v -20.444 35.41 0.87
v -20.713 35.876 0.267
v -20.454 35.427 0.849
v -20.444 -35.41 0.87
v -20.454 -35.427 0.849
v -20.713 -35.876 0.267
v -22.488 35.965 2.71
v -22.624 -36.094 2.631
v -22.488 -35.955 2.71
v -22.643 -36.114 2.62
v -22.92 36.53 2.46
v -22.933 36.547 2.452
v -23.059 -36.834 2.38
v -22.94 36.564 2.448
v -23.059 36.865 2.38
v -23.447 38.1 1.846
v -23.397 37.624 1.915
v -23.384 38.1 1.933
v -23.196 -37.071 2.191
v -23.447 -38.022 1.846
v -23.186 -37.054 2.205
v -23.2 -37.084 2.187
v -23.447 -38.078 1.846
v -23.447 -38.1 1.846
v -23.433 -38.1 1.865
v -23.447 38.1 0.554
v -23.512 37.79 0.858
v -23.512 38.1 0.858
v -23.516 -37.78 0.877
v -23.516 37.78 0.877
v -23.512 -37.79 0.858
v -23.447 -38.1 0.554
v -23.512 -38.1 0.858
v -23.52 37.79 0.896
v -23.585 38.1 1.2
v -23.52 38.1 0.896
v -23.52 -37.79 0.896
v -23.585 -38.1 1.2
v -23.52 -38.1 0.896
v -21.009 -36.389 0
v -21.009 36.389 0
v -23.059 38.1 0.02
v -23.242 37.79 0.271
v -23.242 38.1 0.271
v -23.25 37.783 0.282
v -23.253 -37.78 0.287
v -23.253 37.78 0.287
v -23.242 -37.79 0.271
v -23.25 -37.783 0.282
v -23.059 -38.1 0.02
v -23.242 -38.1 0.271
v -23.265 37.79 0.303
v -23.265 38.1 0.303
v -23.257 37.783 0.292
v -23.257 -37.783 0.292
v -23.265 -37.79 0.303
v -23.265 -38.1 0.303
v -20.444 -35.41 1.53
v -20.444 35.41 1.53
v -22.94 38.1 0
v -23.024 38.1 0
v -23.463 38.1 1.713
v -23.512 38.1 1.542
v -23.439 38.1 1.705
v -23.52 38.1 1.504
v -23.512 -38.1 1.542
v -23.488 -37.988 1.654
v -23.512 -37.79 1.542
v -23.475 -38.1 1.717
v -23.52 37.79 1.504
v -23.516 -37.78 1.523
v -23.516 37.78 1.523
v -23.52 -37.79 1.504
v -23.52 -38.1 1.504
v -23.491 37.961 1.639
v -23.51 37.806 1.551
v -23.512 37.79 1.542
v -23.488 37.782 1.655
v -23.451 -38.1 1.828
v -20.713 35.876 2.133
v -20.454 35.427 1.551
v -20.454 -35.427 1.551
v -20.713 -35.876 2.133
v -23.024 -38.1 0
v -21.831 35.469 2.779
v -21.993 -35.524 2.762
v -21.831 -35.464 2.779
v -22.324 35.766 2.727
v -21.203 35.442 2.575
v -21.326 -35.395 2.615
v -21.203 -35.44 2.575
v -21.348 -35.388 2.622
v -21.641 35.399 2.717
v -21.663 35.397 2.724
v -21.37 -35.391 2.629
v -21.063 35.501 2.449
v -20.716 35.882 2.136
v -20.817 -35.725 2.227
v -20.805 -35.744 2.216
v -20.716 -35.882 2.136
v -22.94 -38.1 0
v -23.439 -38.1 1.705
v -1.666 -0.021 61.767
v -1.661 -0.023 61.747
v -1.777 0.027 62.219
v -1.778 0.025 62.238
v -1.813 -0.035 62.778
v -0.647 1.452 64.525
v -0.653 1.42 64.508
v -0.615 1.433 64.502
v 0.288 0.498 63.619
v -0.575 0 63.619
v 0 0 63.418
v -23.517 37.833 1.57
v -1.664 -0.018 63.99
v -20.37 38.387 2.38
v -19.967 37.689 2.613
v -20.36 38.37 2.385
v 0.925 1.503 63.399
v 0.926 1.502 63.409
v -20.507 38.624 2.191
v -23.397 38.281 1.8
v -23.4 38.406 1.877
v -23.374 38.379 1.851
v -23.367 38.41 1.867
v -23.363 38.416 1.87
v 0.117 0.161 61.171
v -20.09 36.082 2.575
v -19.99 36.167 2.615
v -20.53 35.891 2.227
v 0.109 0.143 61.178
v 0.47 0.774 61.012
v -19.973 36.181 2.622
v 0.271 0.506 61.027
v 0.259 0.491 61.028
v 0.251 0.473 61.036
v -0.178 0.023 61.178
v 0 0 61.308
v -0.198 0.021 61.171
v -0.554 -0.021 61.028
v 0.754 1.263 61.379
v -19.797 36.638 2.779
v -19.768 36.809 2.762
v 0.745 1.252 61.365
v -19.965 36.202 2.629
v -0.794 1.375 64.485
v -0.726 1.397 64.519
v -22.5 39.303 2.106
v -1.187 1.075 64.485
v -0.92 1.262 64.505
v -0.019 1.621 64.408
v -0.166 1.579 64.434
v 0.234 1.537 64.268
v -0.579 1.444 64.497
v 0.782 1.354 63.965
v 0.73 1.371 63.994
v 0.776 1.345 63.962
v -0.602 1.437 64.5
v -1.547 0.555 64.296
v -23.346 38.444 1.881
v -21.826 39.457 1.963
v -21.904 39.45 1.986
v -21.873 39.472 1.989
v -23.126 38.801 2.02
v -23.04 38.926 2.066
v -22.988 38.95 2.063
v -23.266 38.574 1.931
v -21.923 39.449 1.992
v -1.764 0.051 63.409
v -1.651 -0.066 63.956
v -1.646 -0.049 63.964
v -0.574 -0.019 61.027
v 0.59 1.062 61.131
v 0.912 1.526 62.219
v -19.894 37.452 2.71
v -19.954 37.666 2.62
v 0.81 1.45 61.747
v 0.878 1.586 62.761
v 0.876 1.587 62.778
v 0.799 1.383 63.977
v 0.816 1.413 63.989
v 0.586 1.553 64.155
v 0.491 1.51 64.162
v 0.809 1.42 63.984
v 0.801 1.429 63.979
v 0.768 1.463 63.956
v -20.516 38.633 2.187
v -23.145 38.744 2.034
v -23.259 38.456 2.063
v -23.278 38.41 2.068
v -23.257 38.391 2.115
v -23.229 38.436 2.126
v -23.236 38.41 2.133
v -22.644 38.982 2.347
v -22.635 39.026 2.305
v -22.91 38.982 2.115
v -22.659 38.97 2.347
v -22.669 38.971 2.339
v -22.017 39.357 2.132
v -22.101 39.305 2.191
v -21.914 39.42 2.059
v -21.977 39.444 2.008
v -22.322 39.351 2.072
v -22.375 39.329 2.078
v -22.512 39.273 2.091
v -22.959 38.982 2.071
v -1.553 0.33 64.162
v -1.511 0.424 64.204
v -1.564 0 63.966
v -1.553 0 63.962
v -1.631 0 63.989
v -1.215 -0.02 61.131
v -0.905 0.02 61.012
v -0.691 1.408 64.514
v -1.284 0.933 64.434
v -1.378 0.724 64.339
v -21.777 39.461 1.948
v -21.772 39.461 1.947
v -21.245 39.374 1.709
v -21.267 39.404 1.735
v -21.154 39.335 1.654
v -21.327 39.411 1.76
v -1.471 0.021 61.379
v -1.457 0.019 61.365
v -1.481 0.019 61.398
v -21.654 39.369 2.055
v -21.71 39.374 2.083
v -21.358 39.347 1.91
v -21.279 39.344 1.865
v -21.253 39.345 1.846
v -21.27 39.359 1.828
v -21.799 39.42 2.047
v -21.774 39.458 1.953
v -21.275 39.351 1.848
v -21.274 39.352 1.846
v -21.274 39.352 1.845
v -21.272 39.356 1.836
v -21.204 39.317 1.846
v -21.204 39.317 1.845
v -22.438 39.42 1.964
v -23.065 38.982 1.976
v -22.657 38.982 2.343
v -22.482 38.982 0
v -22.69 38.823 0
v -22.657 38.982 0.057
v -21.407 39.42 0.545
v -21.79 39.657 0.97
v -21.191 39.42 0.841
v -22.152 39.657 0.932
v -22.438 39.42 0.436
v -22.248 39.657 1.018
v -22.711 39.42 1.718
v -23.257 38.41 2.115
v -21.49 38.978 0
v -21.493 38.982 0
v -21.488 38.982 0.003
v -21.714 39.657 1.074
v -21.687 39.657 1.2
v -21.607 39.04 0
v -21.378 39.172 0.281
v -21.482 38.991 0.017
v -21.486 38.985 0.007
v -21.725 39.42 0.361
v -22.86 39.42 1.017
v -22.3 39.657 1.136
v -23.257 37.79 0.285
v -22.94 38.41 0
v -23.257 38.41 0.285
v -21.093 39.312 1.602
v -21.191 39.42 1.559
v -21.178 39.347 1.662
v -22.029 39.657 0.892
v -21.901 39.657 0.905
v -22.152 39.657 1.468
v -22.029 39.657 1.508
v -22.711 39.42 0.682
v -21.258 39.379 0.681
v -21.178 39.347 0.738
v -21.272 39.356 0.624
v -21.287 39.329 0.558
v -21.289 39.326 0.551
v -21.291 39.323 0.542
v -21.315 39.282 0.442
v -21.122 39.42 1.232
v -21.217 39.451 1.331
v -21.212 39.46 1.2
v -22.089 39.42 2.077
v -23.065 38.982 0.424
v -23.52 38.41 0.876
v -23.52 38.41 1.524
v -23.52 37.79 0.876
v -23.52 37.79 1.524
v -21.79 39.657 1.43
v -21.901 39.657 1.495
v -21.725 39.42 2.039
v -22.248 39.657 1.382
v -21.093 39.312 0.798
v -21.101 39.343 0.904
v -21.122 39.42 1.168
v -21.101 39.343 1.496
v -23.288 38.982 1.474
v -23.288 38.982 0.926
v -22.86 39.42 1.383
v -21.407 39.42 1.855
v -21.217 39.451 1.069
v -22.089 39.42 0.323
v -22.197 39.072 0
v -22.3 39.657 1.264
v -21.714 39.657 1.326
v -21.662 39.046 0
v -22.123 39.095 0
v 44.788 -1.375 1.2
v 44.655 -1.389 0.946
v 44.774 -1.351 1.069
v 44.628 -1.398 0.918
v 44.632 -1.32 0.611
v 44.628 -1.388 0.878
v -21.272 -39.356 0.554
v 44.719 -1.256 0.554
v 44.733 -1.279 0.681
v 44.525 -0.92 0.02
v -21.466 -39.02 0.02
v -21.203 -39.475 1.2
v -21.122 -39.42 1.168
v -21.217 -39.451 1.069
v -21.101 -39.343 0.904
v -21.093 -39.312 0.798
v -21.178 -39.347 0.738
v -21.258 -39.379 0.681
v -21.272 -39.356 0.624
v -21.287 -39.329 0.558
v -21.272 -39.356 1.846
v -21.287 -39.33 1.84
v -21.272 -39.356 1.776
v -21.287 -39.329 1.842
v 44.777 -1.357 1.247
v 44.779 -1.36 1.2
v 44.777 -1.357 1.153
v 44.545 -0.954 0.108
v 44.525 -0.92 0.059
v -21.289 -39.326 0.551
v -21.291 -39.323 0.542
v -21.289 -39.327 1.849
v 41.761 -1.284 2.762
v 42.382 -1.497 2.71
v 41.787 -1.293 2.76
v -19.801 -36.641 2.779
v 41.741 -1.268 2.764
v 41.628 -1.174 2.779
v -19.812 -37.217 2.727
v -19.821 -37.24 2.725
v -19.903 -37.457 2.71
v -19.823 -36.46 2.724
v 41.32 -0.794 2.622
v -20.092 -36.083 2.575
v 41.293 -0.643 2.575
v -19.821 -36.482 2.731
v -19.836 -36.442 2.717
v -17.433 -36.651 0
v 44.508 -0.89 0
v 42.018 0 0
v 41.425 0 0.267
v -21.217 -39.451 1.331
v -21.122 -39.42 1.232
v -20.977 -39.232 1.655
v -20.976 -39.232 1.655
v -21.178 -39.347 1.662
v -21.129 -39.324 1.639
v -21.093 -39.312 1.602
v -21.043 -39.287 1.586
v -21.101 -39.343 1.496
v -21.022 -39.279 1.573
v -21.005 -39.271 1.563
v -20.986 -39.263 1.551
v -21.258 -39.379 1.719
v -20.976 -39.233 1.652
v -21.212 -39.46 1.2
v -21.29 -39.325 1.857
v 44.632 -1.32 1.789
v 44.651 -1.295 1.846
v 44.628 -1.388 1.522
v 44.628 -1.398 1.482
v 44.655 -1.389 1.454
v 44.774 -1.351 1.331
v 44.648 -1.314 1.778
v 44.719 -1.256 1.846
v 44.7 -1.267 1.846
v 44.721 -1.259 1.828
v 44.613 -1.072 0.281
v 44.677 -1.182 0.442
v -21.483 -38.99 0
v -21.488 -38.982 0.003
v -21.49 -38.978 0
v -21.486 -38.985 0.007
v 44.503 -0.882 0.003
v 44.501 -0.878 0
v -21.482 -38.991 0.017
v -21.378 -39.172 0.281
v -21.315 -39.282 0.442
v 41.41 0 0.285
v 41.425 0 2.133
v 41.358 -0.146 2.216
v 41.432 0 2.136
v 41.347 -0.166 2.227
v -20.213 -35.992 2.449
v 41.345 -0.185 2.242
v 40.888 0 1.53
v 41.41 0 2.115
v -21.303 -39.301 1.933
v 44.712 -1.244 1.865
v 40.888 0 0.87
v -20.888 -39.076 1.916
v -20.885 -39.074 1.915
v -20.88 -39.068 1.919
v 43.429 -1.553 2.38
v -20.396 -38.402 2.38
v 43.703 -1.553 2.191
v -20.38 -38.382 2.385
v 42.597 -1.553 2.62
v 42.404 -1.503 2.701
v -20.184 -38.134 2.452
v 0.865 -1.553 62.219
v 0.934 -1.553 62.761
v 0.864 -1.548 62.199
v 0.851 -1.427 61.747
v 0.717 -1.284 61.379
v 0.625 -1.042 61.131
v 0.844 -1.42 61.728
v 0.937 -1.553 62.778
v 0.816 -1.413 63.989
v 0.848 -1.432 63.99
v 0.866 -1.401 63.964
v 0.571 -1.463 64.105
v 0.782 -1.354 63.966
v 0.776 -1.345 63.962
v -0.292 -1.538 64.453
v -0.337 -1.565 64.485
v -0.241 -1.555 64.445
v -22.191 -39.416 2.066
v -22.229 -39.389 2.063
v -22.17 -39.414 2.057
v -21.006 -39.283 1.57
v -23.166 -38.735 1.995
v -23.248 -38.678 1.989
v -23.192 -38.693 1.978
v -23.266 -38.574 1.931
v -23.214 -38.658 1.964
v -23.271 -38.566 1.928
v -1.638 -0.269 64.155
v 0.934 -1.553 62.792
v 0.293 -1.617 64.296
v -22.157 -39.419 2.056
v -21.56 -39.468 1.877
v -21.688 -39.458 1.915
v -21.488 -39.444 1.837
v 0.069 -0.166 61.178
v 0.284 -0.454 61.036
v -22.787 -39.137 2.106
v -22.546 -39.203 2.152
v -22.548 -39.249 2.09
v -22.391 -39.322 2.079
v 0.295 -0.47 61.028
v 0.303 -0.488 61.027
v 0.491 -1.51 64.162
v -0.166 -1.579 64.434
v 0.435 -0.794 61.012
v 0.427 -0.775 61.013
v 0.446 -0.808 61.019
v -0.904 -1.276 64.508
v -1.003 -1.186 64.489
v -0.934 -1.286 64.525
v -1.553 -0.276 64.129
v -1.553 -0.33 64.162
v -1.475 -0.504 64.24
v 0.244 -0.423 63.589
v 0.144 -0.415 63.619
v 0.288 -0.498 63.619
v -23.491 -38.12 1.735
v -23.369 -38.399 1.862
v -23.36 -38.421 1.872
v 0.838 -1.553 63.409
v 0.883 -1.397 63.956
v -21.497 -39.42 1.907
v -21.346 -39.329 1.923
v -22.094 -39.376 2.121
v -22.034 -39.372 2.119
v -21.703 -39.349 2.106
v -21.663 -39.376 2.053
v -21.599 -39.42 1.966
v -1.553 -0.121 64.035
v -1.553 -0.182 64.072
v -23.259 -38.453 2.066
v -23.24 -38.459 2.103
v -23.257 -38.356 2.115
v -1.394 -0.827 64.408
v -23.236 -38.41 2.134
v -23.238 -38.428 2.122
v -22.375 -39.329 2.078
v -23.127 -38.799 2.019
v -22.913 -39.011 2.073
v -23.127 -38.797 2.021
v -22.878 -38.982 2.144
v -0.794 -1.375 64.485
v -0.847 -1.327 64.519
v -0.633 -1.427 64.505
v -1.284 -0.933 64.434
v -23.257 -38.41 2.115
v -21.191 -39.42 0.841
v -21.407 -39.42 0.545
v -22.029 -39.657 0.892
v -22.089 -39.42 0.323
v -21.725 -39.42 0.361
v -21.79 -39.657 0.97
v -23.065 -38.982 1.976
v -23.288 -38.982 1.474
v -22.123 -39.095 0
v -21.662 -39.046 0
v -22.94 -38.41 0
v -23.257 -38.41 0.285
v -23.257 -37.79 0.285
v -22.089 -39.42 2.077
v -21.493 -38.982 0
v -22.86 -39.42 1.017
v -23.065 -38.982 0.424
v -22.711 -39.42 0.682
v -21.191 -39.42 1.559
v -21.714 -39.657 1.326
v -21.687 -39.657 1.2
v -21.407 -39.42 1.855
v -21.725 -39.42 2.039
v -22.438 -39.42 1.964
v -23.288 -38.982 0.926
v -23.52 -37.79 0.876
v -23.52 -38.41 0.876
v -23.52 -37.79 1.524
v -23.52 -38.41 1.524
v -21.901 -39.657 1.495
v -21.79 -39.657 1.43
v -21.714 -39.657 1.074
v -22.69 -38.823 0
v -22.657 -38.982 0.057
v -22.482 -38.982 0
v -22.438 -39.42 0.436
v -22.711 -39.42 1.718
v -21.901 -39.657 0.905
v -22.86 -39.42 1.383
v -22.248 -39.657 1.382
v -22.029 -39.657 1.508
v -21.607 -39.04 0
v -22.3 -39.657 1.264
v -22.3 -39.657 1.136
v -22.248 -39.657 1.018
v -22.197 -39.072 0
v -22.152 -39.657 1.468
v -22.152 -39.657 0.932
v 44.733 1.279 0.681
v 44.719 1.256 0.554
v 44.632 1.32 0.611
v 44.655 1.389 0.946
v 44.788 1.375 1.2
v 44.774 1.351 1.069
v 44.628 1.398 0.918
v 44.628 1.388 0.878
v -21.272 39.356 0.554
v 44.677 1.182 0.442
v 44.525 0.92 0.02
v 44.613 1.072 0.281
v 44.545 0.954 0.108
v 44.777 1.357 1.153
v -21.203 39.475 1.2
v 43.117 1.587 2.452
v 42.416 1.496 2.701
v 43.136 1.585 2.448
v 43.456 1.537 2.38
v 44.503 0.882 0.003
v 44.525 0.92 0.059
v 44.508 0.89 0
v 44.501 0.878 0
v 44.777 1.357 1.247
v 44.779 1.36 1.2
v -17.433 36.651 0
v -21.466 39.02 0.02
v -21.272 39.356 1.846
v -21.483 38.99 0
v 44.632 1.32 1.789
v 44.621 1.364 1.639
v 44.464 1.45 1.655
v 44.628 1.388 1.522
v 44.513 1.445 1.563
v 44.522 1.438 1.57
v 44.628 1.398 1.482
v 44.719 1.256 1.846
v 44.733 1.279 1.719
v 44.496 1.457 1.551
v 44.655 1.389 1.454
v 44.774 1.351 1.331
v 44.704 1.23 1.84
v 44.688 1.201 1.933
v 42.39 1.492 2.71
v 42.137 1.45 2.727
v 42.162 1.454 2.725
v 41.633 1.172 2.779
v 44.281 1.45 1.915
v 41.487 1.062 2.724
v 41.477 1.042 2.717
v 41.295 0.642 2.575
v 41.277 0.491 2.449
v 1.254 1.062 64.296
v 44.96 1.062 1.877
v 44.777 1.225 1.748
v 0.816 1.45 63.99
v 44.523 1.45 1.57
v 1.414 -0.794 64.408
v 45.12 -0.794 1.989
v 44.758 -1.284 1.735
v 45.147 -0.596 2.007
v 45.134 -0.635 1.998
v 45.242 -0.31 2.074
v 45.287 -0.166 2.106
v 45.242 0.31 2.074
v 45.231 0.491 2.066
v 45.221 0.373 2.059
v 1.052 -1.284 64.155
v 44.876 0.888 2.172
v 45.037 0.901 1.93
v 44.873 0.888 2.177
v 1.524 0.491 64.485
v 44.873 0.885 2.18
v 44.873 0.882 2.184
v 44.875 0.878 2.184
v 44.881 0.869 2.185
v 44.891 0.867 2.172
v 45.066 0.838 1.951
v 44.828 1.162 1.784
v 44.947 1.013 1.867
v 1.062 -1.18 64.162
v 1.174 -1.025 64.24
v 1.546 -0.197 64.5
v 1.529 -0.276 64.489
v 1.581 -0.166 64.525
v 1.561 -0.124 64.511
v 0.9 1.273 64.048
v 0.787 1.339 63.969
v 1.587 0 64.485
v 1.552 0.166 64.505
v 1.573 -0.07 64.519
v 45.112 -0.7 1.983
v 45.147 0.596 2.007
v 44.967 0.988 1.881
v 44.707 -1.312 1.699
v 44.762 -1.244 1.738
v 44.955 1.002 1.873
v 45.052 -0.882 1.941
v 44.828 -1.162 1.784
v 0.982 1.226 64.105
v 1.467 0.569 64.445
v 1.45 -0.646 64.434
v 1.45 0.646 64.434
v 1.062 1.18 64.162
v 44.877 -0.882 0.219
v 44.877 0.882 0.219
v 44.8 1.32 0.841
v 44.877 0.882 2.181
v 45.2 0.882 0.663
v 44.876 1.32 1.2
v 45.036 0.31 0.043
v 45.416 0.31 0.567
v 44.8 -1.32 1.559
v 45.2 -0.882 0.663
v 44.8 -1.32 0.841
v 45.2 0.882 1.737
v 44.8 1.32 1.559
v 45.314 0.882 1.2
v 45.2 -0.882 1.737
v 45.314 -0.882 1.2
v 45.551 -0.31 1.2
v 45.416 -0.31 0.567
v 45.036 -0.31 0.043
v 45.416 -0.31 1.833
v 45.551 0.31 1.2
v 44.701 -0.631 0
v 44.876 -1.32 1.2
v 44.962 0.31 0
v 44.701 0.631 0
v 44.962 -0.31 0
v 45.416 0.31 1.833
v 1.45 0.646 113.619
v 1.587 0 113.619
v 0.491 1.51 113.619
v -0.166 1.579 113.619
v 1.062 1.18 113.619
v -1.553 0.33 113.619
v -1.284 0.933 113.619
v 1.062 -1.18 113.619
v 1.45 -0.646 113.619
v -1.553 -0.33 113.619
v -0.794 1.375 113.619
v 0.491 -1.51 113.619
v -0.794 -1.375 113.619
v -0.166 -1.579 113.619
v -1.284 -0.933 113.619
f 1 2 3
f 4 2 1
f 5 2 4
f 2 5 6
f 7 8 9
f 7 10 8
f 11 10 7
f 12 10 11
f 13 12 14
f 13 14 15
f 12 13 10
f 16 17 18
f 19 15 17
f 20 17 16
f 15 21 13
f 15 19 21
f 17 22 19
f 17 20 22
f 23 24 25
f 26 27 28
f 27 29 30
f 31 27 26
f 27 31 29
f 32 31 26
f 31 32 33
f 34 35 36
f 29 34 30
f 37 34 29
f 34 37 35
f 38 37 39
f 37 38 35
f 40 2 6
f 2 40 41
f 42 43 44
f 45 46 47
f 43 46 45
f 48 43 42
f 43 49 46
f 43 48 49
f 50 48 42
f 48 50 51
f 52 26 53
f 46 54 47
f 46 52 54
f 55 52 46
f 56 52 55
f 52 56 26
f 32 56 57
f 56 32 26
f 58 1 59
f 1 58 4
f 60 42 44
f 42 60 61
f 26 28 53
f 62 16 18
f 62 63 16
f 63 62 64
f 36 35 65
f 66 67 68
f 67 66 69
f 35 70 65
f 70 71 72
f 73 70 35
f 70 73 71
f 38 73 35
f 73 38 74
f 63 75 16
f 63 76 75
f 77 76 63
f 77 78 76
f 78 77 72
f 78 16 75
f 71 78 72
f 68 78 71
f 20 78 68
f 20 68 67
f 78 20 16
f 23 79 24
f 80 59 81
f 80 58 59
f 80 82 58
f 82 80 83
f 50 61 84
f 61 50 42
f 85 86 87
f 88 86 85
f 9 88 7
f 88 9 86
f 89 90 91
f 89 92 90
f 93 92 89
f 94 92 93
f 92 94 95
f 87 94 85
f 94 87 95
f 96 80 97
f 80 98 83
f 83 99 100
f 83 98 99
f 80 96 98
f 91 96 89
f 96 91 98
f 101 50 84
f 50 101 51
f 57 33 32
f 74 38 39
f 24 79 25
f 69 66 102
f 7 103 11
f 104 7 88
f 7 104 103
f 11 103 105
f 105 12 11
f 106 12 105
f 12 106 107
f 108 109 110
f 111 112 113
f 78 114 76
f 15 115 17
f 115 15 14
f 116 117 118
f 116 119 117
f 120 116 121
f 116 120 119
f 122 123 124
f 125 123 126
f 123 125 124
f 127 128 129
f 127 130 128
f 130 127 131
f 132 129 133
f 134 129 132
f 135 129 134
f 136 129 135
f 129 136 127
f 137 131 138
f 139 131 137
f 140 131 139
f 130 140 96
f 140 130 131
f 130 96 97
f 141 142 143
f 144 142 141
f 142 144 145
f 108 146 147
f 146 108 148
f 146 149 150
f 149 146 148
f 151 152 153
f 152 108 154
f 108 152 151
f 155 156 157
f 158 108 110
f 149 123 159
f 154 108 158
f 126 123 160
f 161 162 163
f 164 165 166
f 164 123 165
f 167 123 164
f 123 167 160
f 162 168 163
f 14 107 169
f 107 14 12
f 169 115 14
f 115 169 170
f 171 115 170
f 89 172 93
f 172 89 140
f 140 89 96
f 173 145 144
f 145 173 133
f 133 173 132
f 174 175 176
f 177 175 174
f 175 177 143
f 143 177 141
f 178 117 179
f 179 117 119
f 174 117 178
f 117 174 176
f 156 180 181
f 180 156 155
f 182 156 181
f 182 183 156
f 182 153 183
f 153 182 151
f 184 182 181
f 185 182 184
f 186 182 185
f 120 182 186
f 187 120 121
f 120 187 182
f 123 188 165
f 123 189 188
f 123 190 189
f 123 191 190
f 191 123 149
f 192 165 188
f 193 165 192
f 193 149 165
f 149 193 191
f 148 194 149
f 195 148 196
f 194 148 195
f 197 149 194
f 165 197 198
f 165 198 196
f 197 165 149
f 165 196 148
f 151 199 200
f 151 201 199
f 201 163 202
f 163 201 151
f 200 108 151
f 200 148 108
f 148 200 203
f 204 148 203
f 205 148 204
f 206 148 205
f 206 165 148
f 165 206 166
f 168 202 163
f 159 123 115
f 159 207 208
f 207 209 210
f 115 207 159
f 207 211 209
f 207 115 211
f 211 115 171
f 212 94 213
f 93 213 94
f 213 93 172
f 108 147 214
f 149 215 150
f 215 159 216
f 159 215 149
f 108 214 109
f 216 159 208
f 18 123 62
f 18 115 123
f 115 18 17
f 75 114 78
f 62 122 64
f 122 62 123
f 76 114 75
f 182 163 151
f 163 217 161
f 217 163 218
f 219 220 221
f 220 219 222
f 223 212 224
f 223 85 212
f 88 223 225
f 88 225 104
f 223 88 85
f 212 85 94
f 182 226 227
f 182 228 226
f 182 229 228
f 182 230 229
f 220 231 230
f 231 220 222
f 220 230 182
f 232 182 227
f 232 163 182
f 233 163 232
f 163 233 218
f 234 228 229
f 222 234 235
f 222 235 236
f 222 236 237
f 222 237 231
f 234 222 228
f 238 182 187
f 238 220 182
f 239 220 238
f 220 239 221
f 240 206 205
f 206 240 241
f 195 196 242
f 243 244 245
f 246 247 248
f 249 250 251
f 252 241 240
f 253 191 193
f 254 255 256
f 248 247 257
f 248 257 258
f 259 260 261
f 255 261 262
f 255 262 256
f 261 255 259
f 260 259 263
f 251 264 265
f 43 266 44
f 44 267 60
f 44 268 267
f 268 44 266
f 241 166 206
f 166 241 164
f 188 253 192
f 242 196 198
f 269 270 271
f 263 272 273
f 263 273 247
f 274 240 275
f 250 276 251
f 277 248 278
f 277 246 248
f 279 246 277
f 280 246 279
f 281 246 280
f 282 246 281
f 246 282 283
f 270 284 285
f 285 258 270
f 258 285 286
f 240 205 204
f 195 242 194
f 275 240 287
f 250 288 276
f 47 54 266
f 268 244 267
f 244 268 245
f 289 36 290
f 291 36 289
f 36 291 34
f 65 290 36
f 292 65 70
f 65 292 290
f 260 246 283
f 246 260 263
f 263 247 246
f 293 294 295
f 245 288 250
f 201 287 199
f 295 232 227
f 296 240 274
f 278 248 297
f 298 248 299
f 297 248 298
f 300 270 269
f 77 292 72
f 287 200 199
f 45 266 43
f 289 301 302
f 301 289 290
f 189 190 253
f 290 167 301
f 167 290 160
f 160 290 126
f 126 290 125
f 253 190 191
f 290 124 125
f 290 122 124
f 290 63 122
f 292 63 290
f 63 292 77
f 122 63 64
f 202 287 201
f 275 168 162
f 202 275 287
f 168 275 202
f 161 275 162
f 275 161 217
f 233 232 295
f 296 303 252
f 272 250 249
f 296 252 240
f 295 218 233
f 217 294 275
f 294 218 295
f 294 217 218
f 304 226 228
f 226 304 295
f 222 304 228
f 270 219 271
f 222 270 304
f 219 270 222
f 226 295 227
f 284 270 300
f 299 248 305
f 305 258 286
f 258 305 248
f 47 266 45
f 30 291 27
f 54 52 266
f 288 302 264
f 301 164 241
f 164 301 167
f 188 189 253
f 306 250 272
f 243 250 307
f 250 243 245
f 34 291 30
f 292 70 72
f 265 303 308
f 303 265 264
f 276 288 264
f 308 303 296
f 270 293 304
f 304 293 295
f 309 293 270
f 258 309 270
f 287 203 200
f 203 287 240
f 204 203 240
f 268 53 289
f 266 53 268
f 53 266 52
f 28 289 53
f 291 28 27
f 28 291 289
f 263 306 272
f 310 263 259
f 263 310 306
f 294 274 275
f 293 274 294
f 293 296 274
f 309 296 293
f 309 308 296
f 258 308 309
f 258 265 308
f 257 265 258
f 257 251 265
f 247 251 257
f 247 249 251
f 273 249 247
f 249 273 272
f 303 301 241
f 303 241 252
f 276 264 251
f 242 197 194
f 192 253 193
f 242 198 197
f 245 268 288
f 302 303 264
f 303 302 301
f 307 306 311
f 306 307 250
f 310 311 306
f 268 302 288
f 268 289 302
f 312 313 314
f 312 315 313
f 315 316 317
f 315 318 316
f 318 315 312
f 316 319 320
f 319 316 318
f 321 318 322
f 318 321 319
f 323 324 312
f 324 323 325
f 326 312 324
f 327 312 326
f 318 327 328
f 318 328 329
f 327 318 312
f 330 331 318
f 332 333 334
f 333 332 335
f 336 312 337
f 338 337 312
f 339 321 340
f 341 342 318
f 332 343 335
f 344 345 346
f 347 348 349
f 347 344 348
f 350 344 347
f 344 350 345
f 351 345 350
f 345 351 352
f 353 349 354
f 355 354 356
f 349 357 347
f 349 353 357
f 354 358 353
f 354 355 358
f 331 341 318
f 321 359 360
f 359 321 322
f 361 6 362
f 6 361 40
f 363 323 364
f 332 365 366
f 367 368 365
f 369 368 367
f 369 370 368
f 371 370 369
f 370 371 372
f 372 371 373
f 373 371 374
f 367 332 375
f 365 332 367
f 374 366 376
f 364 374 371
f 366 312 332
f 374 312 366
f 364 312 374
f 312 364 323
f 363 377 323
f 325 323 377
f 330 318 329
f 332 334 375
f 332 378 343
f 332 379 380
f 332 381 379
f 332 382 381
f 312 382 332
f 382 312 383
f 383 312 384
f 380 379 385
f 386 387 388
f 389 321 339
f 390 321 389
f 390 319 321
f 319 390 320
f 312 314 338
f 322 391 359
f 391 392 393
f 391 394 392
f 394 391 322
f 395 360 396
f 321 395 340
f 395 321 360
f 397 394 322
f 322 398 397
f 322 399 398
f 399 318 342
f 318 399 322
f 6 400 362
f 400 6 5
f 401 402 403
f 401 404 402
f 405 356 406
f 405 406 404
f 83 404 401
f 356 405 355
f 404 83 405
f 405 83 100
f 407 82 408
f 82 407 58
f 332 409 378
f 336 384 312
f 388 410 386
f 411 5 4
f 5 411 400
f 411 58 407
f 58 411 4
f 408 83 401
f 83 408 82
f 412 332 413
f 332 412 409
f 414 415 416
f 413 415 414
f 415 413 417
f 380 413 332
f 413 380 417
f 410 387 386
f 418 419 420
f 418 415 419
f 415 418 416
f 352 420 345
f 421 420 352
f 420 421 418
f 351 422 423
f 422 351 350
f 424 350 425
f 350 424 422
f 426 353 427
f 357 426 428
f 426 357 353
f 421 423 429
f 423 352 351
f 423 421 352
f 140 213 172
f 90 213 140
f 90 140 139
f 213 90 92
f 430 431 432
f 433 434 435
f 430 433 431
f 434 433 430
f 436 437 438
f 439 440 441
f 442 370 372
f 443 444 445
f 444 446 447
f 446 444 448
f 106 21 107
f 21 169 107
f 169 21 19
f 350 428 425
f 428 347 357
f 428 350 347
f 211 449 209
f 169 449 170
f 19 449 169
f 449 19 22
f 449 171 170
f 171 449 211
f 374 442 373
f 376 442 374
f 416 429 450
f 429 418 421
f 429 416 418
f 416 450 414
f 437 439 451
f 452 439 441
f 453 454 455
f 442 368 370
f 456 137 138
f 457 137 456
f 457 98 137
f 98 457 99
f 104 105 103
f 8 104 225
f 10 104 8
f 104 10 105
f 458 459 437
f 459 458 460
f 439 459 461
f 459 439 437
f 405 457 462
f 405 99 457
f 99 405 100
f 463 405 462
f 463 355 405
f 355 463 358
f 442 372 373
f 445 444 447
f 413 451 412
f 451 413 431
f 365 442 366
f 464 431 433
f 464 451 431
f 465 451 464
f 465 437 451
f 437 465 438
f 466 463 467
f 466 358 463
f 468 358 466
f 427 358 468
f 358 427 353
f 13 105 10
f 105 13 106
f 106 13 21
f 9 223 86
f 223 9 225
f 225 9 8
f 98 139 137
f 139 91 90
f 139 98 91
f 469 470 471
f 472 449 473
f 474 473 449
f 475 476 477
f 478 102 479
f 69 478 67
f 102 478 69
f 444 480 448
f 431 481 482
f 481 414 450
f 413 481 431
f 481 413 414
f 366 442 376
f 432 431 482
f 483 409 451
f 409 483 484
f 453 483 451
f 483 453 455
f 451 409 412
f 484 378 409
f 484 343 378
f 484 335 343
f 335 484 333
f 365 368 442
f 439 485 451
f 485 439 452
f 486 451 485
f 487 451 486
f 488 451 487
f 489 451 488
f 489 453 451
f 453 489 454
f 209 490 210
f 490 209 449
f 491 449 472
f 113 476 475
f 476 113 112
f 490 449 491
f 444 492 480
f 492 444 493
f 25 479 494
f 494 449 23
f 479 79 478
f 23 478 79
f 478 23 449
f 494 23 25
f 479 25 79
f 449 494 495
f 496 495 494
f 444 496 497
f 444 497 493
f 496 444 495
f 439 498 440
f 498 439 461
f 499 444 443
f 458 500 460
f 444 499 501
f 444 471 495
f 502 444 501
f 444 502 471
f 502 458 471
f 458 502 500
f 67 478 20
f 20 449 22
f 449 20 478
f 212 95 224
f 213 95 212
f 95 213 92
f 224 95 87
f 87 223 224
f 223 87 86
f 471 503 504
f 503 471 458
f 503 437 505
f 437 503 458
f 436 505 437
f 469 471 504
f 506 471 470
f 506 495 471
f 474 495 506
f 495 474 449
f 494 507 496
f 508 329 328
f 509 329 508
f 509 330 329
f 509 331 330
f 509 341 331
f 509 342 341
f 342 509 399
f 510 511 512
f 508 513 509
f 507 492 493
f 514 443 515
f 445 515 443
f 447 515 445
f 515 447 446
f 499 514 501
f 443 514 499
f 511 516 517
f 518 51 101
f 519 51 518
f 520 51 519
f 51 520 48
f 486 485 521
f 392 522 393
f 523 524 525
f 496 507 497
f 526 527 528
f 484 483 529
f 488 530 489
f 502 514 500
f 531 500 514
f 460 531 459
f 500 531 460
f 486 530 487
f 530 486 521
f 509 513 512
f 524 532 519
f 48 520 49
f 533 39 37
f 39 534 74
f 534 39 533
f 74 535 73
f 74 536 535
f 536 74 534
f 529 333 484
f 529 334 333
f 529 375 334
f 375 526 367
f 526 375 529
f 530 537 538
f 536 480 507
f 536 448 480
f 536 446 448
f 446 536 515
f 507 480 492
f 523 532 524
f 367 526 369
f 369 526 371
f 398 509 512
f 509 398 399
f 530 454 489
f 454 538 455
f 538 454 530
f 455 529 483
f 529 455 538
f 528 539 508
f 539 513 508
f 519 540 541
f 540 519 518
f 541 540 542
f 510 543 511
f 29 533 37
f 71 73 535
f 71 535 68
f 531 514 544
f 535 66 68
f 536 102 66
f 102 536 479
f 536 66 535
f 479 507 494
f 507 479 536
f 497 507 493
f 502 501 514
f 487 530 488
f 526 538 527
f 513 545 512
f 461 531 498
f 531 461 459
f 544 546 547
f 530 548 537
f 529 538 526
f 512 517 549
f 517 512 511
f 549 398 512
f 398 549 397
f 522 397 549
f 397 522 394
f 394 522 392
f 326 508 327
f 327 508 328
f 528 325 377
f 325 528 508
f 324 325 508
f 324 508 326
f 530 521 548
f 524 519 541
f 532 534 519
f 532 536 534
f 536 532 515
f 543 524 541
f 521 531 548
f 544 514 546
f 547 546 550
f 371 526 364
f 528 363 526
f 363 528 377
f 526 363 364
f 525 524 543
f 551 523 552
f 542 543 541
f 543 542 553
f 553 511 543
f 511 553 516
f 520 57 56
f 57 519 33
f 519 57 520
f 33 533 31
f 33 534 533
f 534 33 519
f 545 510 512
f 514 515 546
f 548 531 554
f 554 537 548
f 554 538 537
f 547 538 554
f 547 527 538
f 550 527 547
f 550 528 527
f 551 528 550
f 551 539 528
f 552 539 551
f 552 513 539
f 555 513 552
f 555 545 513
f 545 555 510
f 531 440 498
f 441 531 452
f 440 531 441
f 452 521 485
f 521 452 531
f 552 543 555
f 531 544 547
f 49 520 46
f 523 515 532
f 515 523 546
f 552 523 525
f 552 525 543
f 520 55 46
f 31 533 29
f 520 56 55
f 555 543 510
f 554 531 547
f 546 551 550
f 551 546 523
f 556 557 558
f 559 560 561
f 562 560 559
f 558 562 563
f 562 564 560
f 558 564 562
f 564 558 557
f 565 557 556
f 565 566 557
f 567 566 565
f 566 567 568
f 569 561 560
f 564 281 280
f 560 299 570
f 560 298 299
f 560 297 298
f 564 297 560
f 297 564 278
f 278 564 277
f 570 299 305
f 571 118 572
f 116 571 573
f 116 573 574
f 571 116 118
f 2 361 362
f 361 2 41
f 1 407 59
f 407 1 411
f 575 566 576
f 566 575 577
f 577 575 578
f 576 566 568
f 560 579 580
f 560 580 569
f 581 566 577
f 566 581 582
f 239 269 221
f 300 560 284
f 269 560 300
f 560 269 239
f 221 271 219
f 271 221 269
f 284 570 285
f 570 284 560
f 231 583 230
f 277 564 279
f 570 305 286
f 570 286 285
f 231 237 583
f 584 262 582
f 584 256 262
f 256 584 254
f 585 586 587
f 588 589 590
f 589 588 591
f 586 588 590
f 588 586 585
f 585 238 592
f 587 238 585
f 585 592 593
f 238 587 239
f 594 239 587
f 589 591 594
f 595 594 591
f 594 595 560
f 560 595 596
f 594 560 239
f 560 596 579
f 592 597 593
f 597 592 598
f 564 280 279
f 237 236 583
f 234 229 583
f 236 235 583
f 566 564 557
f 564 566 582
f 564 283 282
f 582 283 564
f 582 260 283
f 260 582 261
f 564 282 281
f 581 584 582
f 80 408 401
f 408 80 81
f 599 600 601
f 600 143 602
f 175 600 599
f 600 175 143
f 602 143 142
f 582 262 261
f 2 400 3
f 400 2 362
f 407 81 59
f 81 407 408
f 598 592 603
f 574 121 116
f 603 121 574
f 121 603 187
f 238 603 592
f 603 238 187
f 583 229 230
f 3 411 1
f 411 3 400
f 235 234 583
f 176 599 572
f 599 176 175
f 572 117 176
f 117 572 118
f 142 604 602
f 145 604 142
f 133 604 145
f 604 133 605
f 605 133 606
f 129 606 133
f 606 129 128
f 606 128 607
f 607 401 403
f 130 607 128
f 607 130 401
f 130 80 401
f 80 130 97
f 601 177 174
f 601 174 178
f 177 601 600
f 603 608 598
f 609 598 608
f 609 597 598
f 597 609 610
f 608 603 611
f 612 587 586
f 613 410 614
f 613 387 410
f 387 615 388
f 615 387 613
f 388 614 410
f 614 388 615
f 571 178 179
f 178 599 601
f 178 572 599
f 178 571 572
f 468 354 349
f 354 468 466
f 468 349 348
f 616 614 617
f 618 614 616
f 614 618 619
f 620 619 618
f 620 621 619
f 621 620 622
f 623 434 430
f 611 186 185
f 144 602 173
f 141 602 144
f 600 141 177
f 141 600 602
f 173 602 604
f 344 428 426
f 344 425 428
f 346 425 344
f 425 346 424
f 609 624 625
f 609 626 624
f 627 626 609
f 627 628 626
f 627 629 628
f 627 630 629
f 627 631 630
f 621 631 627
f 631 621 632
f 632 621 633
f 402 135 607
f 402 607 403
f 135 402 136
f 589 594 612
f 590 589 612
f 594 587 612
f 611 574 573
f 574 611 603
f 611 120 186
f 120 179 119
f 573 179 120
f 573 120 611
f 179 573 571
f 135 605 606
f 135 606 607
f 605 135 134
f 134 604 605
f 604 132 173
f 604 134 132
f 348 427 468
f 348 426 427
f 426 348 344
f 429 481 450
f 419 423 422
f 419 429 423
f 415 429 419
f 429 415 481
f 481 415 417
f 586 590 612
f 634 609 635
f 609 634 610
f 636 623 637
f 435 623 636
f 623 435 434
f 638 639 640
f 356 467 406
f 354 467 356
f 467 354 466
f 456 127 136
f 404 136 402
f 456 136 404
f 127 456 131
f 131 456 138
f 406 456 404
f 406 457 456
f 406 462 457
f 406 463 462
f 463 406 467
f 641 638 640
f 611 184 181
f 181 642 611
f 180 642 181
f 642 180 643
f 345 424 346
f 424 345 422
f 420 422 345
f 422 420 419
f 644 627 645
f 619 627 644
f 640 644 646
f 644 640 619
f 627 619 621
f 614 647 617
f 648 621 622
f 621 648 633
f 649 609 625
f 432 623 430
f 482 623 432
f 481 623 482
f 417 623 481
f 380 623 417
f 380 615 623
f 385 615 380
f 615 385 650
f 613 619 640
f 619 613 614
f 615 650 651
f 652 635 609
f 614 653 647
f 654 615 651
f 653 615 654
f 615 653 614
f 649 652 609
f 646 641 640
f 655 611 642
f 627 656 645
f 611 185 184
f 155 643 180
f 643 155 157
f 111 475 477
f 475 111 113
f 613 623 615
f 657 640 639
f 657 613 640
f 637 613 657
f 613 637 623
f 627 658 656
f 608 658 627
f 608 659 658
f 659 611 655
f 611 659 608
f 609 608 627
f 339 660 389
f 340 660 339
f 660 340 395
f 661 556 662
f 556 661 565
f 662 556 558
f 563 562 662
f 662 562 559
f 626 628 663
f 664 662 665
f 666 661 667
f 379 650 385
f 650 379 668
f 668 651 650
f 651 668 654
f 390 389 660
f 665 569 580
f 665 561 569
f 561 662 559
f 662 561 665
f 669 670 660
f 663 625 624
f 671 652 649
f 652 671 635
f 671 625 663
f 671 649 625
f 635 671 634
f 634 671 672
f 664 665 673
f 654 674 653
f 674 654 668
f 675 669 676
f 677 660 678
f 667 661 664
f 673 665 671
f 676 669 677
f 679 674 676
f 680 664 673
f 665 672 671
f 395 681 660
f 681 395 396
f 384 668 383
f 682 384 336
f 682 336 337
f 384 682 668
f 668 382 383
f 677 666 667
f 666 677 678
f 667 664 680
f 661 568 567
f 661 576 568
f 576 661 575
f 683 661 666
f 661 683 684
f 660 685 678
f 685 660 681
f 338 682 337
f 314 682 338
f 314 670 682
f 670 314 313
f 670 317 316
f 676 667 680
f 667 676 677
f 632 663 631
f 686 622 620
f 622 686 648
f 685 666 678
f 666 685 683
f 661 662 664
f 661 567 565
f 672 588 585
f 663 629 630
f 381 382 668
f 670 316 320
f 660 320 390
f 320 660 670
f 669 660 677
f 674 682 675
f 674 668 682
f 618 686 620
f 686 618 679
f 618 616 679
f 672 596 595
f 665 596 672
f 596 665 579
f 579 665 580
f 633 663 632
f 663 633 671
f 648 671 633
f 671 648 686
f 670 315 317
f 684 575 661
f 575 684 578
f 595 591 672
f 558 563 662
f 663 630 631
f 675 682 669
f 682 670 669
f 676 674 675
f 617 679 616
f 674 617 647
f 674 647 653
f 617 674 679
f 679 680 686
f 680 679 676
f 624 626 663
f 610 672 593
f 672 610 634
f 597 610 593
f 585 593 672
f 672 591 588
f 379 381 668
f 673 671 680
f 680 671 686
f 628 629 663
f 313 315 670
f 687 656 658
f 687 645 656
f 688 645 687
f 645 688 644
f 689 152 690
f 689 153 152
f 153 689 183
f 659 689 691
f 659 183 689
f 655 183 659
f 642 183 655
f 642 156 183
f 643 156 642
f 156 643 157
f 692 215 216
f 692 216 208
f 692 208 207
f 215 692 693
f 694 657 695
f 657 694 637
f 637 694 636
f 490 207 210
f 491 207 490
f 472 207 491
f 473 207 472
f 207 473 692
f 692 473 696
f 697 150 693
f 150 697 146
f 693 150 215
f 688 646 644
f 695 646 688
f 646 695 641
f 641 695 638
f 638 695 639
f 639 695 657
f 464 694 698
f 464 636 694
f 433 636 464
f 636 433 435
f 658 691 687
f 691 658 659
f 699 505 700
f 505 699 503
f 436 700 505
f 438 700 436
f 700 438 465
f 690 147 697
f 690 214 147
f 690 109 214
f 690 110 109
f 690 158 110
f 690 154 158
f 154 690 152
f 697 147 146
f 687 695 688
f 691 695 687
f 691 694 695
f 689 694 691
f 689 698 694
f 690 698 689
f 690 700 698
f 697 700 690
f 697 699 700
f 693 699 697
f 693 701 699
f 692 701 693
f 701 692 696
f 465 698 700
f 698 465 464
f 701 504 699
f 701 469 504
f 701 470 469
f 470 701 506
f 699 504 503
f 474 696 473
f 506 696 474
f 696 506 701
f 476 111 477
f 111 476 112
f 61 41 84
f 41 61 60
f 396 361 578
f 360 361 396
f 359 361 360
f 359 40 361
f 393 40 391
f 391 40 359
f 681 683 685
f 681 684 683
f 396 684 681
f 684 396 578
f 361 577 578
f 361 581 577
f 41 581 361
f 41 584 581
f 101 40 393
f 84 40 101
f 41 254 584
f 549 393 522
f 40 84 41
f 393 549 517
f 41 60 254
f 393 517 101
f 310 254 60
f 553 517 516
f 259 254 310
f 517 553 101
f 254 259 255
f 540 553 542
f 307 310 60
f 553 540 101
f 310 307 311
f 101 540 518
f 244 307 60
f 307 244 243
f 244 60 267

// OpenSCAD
// Type of bubble frame
frame_type=1; // [1:Tetrahedron, 2:Octahedron, 3:Triangle Prism, 4:Hexahedron (cube), 5:Pentagon Prism, 6:Hexagon Prism]
// Length of edges in mm
edge_length=76.2;
// Length of handle in mm
handle_length=50;
// Radius of edges and handle
edge_radius=1.5875;

/* [Hidden] */
resolution=15;

// tetra
if (frame_type==1) {
  assign (numsides=3)
  {
  assign (radius2=(edge_length/2)/(sin((360/numsides)/2))) {
  assign (angle=360/numsides, angle2=90-(180/numsides), adjustup=sqrt(pow(radius2,2)-pow((edge_length/2),2))+1.2, numrotation=(((numsides-3)/2)-(((numsides-3)%2)*0.5))) {

    difference() {
      translate([0,0,1.2]) rotate(a=[-90,0,0]) union() {
        for (i=[angle:angle:360.1]) {
          assign (x=(radius2*cos(i)), y=0, z=(radius2*sin(i)), current_angle=(-1*(i+(angle/2))))
          {
          translate([x,y,z]) rotate(a=[0,current_angle,0]) cylinder(h = edge_length, r=edge_radius, center = false, $fn=resolution);
          translate([x,y,z]) rotate(a=[55,current_angle-30,0]) cylinder(h = edge_length, r=edge_radius, center = false, $fn=resolution);
          translate([x,y,z]) rotate(a=[55,current_angle-30,0]) cylinder(h = edge_length, r=edge_radius, center = false, $fn=resolution);
          translate([x,y,z]) sphere(edge_radius, $fn=resolution); 
          }
          translate([0,-(edge_length*cos(35)),0]) rotate(a=[90,0,0]) cylinder(h = handle_length, r=edge_radius, center = false, $fn=resolution);
        }
      }
      translate([-5-edge_length/2,-5-edge_length/2,-6]) rotate(a=[0,0,0]) cube(size = [edge_length+15,edge_length+15,6], center = false, $fn=resolution);
    }
  }
  }
  }
}

// octo
else if (frame_type==2) {
  assign (numsides=4)
  {
  assign (radius2=(edge_length/2)/(sin((360/numsides)/2))) {
  assign (angle=360/numsides, angle2=90-(180/numsides), adjustup=sqrt(pow(radius2,2)-pow((edge_length/2),2))+1.2, numrotation=(((numsides-3)/2)-(((numsides-3)%2)*0.5))) {
  
  difference() {
      translate([0,0,((edge_length/2)*cos(35))]) rotate(a=[45,35,0]) union() {
        for (i=[angle:angle:360.1]) {
          assign (x=(radius2*cos(i)), y=0, z=(radius2*sin(i)), current_angle=(-1*(i+(angle/2))))
          {
          translate([x,y,z]) rotate(a=[0,current_angle,0]) cylinder(h = edge_length, r=edge_radius, center = false, $fn=resolution);
          translate([x,y,z]) rotate(a=[45,current_angle-45,0]) cylinder(h = edge_length, r=edge_radius, center = false, $fn=resolution);
          translate([x,y,z]) rotate(a=[-45,current_angle-45,0]) cylinder(h = edge_length, r=edge_radius, center = false, $fn=resolution);
          translate([x,y,z]) sphere(edge_radius, $fn=resolution); 
          }
          translate([0,edge_length*cos(45),0]) sphere(edge_radius, $fn=resolution); 
          translate([0,-edge_length*cos(45),0]) sphere(edge_radius, $fn=resolution); 
          translate([0,0,edge_length*cos(45)]) cylinder(h = handle_length, r=edge_radius, center = false, $fn=resolution);
        }
      }
      translate([-5-edge_length/2,-5-edge_length/2,-6]) rotate(a=[0,0,0]) cube(size = [edge_length+15,edge_length+15,6], center = false, $fn=resolution);
    }
  }
  }
  }
}


// prisms
else {
  assign (numsides=frame_type)
  {
  assign (radius2=(edge_length/2)/(sin((360/numsides)/2))) {
  assign (angle=360/numsides, angle2=90-(180/numsides), adjustup=sqrt(pow(radius2,2)-pow((edge_length/2),2))+1.2, numrotation=(((numsides-3)/2)-(((numsides-3)%2)*0.5))) {

    difference() {
      translate([0,-(edge_length/2),adjustup]) rotate(a=[0,angle2-numrotation*angle,0]) union() {
        for (i=[angle:angle:360.1]) {
          assign (x=(radius2*cos(i)), y=0, z=(radius2*sin(i)), current_angle=(-1*(i+(angle/2))))
          {
          translate([x,y,z]) rotate(a=[0,current_angle,0]) cylinder(h = edge_length, r=edge_radius, center = false, $fn=resolution);
          translate([x,y,z]) sphere(edge_radius, $fn=resolution); 
          translate([x,y,z]) rotate(a=[-90,current_angle,0]) cylinder(h = edge_length, r=edge_radius, center = false, $fn=resolution);
          translate([x,y+edge_length,z]) rotate(a=[0,current_angle,0]) cylinder(h = edge_length, r=edge_radius, center = false, $fn=resolution);
          translate([x,y+edge_length,z]) sphere(edge_radius, $fn=resolution); 
          }
        }
        translate([radius2*cos(angle),(edge_length/2),radius2*sin(angle)]) rotate(a=[0,90-angle,0]) cylinder(h = handle_length, r=edge_radius, center = false, $fn=resolution);
      }
      translate([-5-edge_length/2,-5-edge_length/2,-6]) rotate(a=[0,0,0]) cube(size = [edge_length+15,edge_length+15,6], center = false, $fn=resolution);
    }
  }
  }
  }
}
/**/
